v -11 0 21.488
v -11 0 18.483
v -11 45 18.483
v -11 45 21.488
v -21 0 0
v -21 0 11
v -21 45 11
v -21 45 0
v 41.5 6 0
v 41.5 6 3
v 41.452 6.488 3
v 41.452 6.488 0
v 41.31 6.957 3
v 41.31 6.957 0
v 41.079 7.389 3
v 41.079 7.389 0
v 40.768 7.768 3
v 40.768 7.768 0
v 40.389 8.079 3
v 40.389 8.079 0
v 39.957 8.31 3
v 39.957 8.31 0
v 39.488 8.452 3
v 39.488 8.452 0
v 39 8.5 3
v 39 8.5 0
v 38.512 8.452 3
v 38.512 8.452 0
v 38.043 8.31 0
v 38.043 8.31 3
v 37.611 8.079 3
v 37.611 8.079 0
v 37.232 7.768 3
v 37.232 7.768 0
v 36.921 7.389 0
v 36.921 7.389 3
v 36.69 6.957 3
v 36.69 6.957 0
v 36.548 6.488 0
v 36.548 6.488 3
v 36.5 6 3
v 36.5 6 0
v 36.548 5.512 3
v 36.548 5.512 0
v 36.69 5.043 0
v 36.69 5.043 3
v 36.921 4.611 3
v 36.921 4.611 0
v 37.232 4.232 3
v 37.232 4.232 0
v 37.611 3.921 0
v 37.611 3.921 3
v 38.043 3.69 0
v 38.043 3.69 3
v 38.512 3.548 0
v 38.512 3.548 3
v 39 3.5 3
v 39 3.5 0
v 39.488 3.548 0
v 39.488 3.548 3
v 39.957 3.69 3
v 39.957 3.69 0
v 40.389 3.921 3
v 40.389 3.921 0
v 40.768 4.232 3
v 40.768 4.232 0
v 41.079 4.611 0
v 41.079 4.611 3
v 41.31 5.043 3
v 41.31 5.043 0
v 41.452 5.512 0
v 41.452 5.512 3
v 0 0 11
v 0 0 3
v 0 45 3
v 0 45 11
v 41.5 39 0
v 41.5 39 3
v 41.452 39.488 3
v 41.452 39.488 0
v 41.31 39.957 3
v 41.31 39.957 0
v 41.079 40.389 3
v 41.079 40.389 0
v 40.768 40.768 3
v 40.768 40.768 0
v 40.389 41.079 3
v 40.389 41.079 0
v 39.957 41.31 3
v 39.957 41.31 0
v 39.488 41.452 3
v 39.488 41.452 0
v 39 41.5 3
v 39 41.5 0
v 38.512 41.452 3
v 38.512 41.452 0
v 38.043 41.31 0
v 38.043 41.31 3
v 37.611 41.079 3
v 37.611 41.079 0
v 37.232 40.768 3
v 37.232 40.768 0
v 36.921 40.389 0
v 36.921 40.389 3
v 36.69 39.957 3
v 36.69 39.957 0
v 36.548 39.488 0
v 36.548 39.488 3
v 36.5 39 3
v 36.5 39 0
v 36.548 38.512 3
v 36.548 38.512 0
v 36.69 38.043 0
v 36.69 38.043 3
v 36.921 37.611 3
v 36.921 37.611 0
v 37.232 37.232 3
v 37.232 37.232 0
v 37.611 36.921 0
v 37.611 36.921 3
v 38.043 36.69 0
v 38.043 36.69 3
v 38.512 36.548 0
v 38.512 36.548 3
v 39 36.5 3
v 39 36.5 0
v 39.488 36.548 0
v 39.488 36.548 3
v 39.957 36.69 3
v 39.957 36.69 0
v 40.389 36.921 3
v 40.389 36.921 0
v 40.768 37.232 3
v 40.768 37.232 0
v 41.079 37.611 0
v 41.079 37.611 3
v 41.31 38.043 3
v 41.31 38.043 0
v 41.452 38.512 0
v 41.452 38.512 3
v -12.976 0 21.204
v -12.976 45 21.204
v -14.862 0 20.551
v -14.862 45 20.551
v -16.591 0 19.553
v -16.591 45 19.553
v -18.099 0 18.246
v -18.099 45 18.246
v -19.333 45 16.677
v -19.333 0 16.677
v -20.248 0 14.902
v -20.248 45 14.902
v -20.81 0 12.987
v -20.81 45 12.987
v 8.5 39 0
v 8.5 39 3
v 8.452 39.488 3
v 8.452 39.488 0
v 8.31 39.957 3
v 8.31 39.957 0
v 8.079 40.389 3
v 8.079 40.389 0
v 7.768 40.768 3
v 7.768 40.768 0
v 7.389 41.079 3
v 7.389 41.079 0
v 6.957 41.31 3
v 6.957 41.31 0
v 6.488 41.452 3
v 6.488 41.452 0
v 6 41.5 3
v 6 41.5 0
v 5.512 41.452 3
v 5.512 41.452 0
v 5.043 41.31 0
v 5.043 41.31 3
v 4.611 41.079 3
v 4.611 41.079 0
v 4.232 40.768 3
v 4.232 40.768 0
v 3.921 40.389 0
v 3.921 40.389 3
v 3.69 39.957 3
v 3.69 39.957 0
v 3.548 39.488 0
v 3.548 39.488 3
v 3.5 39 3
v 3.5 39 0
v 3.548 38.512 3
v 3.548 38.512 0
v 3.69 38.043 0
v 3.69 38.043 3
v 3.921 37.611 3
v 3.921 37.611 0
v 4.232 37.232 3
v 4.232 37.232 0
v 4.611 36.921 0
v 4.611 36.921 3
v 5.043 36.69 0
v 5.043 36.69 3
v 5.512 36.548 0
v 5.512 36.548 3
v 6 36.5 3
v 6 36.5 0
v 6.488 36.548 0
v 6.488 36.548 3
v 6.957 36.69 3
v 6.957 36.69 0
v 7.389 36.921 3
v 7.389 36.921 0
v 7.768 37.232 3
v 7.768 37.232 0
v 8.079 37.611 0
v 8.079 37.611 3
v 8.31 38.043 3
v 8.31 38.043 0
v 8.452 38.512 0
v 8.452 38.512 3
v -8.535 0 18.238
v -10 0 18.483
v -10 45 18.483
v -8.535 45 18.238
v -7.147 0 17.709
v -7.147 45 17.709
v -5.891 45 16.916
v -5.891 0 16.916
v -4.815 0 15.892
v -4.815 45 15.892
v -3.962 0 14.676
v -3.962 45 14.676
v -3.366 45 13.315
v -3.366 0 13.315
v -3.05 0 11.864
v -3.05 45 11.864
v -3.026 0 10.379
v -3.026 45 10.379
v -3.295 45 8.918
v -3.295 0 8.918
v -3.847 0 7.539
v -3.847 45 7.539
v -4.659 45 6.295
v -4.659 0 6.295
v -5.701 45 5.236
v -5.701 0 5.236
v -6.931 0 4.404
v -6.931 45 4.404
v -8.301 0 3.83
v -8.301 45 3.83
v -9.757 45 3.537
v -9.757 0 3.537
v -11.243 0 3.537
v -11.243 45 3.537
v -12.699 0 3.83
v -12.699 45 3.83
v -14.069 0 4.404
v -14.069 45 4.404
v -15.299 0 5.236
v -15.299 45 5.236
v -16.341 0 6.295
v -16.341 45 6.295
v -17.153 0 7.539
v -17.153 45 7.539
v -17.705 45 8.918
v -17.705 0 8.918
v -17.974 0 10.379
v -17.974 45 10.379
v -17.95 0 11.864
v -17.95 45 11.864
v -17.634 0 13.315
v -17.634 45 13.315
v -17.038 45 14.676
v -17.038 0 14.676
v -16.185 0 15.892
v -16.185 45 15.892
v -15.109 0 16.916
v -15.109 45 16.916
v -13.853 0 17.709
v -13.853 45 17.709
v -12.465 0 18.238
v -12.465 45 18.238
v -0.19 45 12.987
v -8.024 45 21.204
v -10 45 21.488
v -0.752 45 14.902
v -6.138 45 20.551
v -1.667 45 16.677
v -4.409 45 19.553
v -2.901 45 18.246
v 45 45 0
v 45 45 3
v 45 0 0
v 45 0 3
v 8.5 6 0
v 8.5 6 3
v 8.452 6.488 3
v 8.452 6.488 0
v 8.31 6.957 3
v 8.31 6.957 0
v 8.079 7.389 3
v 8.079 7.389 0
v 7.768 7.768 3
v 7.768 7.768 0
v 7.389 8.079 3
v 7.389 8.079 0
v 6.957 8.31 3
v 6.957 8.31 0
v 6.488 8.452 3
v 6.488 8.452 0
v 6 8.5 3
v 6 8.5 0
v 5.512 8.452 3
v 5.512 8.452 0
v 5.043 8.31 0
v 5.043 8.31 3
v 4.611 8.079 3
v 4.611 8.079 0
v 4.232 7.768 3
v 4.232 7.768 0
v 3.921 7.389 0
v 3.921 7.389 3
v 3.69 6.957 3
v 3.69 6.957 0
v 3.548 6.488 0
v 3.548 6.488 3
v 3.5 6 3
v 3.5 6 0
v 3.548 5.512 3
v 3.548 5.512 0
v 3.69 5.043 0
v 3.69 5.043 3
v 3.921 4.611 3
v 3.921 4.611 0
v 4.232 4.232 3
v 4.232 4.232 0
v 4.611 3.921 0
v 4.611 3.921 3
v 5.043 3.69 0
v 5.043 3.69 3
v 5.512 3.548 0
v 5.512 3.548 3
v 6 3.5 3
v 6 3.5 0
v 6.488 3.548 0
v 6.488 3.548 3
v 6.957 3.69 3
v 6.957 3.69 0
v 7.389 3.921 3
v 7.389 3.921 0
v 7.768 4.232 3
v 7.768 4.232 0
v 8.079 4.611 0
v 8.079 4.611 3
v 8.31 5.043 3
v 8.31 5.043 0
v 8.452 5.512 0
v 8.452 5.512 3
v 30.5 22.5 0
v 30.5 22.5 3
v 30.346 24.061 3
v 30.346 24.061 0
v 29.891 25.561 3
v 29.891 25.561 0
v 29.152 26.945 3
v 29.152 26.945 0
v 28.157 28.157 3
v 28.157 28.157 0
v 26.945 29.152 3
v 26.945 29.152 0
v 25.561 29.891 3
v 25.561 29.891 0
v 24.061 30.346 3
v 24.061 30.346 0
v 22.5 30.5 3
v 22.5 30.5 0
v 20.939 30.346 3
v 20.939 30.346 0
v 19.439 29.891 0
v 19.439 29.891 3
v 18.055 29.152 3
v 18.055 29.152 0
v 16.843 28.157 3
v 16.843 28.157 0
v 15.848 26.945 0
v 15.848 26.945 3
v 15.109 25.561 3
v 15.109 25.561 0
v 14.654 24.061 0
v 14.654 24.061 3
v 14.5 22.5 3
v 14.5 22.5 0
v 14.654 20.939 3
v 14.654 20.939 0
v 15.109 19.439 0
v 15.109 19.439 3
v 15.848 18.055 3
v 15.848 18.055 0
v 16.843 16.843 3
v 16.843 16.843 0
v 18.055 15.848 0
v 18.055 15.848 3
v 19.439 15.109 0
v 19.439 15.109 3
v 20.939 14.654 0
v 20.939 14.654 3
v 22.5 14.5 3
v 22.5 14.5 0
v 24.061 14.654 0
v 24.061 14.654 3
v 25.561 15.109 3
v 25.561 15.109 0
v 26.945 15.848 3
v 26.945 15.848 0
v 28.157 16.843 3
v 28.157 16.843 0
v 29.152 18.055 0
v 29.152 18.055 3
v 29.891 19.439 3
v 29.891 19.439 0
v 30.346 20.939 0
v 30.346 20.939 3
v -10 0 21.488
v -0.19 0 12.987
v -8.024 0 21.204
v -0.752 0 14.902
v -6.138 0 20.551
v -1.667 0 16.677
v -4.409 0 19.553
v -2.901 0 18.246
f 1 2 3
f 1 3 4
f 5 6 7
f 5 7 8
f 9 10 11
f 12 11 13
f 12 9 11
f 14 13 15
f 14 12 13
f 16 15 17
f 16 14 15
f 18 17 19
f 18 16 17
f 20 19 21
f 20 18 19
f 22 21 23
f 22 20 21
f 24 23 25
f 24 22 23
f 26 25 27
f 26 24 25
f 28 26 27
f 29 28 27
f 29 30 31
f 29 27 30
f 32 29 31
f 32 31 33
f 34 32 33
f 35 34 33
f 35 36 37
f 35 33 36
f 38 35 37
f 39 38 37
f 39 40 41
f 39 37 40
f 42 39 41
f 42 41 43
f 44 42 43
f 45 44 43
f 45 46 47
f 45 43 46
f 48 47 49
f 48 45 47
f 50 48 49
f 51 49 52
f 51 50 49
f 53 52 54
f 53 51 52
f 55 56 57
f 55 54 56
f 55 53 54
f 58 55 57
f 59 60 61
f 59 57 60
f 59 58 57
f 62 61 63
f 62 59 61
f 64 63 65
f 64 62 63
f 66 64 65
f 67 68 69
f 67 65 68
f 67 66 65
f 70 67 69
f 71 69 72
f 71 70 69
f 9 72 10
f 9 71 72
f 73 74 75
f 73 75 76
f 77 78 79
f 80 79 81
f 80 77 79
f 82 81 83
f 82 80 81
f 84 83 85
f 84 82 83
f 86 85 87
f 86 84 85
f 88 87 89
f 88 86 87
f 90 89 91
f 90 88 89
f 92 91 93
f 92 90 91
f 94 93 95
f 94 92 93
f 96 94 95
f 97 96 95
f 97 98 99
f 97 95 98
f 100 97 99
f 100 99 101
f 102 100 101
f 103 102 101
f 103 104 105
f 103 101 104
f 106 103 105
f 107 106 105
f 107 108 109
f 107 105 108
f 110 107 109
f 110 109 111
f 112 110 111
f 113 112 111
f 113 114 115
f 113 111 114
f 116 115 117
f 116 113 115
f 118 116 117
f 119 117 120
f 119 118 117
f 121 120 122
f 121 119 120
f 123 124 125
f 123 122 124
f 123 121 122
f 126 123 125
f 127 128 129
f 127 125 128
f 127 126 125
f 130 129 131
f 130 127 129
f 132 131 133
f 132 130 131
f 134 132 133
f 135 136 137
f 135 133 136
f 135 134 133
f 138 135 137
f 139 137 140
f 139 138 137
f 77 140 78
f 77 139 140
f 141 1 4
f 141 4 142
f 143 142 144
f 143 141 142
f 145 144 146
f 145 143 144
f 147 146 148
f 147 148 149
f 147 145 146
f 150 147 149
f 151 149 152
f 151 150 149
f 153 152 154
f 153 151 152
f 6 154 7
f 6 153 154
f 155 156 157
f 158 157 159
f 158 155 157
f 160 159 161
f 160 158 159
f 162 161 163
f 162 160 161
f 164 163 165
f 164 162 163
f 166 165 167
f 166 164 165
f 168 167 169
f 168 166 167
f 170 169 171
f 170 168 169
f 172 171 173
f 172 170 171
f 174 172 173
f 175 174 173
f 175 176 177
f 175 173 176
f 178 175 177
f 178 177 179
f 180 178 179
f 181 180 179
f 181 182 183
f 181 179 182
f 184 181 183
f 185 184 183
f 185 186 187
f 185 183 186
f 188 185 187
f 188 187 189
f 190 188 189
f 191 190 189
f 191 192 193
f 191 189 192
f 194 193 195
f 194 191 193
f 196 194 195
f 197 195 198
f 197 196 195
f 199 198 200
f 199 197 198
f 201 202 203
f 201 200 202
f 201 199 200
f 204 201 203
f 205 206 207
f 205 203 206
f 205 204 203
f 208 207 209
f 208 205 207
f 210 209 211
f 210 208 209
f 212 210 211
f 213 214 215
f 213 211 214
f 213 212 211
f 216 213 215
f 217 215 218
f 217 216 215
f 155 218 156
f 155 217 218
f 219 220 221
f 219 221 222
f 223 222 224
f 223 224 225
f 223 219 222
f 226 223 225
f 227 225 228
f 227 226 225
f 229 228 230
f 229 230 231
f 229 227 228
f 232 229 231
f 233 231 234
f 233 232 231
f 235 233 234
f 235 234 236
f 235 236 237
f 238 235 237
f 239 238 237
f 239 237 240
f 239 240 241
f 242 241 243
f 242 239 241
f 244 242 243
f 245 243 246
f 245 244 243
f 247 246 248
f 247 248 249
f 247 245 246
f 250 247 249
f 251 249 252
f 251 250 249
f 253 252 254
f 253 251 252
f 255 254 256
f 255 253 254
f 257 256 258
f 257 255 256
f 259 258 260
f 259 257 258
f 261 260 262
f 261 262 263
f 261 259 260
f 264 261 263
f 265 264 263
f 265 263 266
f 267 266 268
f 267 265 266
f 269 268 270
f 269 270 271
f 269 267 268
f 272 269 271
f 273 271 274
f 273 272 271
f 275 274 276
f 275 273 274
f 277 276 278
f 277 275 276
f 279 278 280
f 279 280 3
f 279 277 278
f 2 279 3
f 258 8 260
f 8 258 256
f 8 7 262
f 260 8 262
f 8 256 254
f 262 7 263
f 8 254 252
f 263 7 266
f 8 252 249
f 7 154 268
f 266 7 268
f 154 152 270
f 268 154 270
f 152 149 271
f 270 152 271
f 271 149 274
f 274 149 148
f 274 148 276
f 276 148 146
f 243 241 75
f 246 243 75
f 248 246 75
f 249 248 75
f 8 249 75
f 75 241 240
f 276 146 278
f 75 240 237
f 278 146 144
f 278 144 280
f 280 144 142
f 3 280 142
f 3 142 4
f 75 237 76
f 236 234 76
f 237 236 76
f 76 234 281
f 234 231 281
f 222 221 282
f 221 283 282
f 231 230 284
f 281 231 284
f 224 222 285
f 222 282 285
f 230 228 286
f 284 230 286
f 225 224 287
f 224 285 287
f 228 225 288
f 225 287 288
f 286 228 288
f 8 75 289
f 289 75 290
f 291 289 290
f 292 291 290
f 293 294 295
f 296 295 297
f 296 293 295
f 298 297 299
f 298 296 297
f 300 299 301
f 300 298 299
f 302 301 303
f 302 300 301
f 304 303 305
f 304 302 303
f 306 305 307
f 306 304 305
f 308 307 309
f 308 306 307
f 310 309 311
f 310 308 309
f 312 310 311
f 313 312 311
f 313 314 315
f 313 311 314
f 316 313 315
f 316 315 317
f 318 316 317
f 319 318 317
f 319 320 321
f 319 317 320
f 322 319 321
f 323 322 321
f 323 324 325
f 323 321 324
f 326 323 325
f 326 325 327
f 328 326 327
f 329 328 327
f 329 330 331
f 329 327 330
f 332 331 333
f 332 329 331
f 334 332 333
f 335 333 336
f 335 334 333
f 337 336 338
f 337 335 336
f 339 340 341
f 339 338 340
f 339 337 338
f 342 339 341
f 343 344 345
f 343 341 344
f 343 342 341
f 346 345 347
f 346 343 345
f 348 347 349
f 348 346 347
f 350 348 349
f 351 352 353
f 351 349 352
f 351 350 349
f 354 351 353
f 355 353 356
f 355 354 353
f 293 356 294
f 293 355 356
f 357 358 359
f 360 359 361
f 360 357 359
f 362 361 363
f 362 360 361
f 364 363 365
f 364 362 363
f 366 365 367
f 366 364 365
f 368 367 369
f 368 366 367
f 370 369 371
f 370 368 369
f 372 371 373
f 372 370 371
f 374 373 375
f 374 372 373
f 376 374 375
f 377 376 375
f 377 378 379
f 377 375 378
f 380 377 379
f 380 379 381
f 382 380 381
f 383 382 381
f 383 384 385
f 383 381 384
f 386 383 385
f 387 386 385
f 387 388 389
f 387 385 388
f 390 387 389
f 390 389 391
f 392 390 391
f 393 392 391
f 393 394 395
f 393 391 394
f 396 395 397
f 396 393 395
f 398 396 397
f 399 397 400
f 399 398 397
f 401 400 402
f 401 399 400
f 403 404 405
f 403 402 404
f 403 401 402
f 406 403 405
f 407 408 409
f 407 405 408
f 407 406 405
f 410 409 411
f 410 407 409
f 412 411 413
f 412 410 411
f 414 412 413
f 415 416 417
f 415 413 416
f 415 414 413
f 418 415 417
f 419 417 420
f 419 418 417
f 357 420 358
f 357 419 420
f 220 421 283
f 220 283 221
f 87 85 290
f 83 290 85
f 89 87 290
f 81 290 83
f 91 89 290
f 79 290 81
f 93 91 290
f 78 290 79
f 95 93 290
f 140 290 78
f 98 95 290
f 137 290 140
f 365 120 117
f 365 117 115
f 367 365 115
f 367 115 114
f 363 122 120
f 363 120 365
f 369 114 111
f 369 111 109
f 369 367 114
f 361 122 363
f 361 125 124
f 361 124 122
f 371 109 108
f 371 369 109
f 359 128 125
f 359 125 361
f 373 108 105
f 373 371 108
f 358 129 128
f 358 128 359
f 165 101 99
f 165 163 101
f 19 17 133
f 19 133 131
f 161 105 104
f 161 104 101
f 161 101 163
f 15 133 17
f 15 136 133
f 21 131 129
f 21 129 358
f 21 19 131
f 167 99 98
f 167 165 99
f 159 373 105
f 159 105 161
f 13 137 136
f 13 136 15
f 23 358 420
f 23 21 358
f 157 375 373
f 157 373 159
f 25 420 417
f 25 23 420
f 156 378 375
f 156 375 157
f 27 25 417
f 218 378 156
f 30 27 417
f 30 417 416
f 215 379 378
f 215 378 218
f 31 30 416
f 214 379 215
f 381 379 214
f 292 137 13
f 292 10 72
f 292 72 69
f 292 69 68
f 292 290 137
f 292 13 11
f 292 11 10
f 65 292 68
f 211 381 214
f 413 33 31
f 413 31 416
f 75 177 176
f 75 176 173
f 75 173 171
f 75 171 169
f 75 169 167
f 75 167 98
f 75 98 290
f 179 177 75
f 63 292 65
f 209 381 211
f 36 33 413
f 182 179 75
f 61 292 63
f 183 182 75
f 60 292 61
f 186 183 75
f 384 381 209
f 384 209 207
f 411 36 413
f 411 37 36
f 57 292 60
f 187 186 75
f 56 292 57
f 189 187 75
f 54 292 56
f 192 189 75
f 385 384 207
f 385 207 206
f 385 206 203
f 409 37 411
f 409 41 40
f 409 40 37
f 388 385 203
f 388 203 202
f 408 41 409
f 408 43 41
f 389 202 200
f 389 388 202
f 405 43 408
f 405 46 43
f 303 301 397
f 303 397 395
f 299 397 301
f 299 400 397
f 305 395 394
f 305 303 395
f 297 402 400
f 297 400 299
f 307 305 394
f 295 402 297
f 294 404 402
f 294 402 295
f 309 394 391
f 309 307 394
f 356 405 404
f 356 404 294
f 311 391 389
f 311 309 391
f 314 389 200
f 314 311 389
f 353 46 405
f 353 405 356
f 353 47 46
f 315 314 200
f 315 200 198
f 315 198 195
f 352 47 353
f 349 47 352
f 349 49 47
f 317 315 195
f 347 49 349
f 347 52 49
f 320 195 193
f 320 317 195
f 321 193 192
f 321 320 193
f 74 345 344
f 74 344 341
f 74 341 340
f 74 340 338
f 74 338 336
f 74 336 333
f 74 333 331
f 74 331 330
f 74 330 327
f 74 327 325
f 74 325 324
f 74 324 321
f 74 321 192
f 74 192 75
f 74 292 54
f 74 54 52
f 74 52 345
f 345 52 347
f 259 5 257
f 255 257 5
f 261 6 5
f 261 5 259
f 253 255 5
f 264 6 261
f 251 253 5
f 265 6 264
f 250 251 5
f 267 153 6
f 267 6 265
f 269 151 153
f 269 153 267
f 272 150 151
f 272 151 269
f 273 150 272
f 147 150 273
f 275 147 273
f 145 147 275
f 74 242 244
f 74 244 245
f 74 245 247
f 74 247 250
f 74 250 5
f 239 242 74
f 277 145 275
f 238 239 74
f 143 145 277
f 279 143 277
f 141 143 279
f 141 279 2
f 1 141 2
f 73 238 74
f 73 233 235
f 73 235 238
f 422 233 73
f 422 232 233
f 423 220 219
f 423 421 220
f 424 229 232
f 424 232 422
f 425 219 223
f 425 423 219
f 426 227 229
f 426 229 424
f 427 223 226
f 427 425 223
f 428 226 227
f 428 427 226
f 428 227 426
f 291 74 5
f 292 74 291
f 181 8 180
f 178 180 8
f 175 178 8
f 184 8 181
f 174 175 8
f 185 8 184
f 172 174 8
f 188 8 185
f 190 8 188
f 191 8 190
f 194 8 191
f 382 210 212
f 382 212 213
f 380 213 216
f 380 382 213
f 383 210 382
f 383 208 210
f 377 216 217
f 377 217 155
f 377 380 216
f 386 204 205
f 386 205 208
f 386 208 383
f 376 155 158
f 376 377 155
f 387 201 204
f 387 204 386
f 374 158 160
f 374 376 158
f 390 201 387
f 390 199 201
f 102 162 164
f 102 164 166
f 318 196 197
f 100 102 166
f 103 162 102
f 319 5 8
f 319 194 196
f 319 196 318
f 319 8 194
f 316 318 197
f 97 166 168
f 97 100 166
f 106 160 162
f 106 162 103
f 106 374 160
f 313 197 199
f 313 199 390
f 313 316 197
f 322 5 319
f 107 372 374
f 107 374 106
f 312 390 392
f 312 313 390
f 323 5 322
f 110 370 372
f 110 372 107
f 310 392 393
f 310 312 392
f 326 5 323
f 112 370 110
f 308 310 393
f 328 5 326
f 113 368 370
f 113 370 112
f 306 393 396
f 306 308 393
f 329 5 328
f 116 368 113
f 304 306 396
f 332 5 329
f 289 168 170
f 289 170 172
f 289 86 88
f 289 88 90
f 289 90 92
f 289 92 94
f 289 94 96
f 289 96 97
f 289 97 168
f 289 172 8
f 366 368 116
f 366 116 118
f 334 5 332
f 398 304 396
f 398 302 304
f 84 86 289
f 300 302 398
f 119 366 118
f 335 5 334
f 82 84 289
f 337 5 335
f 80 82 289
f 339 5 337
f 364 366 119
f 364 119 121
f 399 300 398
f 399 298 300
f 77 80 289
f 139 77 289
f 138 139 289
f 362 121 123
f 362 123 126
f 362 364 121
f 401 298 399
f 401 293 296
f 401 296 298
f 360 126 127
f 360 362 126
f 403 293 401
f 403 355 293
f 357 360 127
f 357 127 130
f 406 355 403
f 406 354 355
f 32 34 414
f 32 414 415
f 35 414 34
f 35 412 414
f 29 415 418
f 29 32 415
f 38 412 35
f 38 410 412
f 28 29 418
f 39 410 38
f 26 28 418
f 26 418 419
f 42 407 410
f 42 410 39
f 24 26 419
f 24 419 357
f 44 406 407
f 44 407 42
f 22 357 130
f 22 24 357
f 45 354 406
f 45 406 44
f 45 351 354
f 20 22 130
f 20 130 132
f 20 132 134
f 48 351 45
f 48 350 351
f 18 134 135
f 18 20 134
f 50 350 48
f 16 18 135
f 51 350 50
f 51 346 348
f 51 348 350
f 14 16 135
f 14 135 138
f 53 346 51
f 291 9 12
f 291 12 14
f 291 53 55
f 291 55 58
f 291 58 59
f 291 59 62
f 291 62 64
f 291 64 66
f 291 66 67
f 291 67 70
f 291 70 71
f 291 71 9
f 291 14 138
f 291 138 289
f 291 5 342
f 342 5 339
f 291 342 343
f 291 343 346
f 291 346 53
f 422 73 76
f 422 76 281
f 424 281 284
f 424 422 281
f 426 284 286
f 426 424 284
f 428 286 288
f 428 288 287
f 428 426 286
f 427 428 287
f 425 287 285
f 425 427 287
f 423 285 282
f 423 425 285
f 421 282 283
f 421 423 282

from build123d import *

# Parameters (mm, degrees)
F1_DEPTH = 45
F2_R     = 8
F2_R_2   = 2.5
F3_DEPTH = 10


with BuildPart() as f1:
    # F0 (on Front) → F1 (new body)
    with BuildSketch(Plane.XZ):
        with BuildLine():
            ThreePointArc((-10, 18.483315), (-10.5, 3.5), (-11, 18.483315))
            Line((-11, 18.483315), (-11, 21.488088))
            ThreePointArc((-11, 21.488088), (-18.099342, 18.245688), (-21, 11))
            Line((-21, 11), (-21, 0))
            Line((-21, 0), (45, 0))
            Line((45, 0), (45, 3))
            Line((45, 3), (0, 3))
            Line((0, 3), (0, 11))
            ThreePointArc((0, 11), (-2.900658, 18.245688), (-10, 21.488088))
            Line((-10, 21.488088), (-10, 18.483315))
        make_face()
    extrude(amount=-F1_DEPTH)

    # F2 (on Top) → F3 (cut)
    with BuildSketch(Plane.XY):
        with Locations((22.5, 22.5)):
            Circle(F2_R)
        with Locations((6, 39)):
            Circle(F2_R_2)
        with Locations((39, 39)):
            Circle(F2_R_2)
        with Locations((39, 6)):
            Circle(F2_R_2)
        with Locations((6, 6)):
            Circle(F2_R_2)
    extrude(amount=F3_DEPTH, mode=Mode.SUBTRACT)


solid = f1.part
